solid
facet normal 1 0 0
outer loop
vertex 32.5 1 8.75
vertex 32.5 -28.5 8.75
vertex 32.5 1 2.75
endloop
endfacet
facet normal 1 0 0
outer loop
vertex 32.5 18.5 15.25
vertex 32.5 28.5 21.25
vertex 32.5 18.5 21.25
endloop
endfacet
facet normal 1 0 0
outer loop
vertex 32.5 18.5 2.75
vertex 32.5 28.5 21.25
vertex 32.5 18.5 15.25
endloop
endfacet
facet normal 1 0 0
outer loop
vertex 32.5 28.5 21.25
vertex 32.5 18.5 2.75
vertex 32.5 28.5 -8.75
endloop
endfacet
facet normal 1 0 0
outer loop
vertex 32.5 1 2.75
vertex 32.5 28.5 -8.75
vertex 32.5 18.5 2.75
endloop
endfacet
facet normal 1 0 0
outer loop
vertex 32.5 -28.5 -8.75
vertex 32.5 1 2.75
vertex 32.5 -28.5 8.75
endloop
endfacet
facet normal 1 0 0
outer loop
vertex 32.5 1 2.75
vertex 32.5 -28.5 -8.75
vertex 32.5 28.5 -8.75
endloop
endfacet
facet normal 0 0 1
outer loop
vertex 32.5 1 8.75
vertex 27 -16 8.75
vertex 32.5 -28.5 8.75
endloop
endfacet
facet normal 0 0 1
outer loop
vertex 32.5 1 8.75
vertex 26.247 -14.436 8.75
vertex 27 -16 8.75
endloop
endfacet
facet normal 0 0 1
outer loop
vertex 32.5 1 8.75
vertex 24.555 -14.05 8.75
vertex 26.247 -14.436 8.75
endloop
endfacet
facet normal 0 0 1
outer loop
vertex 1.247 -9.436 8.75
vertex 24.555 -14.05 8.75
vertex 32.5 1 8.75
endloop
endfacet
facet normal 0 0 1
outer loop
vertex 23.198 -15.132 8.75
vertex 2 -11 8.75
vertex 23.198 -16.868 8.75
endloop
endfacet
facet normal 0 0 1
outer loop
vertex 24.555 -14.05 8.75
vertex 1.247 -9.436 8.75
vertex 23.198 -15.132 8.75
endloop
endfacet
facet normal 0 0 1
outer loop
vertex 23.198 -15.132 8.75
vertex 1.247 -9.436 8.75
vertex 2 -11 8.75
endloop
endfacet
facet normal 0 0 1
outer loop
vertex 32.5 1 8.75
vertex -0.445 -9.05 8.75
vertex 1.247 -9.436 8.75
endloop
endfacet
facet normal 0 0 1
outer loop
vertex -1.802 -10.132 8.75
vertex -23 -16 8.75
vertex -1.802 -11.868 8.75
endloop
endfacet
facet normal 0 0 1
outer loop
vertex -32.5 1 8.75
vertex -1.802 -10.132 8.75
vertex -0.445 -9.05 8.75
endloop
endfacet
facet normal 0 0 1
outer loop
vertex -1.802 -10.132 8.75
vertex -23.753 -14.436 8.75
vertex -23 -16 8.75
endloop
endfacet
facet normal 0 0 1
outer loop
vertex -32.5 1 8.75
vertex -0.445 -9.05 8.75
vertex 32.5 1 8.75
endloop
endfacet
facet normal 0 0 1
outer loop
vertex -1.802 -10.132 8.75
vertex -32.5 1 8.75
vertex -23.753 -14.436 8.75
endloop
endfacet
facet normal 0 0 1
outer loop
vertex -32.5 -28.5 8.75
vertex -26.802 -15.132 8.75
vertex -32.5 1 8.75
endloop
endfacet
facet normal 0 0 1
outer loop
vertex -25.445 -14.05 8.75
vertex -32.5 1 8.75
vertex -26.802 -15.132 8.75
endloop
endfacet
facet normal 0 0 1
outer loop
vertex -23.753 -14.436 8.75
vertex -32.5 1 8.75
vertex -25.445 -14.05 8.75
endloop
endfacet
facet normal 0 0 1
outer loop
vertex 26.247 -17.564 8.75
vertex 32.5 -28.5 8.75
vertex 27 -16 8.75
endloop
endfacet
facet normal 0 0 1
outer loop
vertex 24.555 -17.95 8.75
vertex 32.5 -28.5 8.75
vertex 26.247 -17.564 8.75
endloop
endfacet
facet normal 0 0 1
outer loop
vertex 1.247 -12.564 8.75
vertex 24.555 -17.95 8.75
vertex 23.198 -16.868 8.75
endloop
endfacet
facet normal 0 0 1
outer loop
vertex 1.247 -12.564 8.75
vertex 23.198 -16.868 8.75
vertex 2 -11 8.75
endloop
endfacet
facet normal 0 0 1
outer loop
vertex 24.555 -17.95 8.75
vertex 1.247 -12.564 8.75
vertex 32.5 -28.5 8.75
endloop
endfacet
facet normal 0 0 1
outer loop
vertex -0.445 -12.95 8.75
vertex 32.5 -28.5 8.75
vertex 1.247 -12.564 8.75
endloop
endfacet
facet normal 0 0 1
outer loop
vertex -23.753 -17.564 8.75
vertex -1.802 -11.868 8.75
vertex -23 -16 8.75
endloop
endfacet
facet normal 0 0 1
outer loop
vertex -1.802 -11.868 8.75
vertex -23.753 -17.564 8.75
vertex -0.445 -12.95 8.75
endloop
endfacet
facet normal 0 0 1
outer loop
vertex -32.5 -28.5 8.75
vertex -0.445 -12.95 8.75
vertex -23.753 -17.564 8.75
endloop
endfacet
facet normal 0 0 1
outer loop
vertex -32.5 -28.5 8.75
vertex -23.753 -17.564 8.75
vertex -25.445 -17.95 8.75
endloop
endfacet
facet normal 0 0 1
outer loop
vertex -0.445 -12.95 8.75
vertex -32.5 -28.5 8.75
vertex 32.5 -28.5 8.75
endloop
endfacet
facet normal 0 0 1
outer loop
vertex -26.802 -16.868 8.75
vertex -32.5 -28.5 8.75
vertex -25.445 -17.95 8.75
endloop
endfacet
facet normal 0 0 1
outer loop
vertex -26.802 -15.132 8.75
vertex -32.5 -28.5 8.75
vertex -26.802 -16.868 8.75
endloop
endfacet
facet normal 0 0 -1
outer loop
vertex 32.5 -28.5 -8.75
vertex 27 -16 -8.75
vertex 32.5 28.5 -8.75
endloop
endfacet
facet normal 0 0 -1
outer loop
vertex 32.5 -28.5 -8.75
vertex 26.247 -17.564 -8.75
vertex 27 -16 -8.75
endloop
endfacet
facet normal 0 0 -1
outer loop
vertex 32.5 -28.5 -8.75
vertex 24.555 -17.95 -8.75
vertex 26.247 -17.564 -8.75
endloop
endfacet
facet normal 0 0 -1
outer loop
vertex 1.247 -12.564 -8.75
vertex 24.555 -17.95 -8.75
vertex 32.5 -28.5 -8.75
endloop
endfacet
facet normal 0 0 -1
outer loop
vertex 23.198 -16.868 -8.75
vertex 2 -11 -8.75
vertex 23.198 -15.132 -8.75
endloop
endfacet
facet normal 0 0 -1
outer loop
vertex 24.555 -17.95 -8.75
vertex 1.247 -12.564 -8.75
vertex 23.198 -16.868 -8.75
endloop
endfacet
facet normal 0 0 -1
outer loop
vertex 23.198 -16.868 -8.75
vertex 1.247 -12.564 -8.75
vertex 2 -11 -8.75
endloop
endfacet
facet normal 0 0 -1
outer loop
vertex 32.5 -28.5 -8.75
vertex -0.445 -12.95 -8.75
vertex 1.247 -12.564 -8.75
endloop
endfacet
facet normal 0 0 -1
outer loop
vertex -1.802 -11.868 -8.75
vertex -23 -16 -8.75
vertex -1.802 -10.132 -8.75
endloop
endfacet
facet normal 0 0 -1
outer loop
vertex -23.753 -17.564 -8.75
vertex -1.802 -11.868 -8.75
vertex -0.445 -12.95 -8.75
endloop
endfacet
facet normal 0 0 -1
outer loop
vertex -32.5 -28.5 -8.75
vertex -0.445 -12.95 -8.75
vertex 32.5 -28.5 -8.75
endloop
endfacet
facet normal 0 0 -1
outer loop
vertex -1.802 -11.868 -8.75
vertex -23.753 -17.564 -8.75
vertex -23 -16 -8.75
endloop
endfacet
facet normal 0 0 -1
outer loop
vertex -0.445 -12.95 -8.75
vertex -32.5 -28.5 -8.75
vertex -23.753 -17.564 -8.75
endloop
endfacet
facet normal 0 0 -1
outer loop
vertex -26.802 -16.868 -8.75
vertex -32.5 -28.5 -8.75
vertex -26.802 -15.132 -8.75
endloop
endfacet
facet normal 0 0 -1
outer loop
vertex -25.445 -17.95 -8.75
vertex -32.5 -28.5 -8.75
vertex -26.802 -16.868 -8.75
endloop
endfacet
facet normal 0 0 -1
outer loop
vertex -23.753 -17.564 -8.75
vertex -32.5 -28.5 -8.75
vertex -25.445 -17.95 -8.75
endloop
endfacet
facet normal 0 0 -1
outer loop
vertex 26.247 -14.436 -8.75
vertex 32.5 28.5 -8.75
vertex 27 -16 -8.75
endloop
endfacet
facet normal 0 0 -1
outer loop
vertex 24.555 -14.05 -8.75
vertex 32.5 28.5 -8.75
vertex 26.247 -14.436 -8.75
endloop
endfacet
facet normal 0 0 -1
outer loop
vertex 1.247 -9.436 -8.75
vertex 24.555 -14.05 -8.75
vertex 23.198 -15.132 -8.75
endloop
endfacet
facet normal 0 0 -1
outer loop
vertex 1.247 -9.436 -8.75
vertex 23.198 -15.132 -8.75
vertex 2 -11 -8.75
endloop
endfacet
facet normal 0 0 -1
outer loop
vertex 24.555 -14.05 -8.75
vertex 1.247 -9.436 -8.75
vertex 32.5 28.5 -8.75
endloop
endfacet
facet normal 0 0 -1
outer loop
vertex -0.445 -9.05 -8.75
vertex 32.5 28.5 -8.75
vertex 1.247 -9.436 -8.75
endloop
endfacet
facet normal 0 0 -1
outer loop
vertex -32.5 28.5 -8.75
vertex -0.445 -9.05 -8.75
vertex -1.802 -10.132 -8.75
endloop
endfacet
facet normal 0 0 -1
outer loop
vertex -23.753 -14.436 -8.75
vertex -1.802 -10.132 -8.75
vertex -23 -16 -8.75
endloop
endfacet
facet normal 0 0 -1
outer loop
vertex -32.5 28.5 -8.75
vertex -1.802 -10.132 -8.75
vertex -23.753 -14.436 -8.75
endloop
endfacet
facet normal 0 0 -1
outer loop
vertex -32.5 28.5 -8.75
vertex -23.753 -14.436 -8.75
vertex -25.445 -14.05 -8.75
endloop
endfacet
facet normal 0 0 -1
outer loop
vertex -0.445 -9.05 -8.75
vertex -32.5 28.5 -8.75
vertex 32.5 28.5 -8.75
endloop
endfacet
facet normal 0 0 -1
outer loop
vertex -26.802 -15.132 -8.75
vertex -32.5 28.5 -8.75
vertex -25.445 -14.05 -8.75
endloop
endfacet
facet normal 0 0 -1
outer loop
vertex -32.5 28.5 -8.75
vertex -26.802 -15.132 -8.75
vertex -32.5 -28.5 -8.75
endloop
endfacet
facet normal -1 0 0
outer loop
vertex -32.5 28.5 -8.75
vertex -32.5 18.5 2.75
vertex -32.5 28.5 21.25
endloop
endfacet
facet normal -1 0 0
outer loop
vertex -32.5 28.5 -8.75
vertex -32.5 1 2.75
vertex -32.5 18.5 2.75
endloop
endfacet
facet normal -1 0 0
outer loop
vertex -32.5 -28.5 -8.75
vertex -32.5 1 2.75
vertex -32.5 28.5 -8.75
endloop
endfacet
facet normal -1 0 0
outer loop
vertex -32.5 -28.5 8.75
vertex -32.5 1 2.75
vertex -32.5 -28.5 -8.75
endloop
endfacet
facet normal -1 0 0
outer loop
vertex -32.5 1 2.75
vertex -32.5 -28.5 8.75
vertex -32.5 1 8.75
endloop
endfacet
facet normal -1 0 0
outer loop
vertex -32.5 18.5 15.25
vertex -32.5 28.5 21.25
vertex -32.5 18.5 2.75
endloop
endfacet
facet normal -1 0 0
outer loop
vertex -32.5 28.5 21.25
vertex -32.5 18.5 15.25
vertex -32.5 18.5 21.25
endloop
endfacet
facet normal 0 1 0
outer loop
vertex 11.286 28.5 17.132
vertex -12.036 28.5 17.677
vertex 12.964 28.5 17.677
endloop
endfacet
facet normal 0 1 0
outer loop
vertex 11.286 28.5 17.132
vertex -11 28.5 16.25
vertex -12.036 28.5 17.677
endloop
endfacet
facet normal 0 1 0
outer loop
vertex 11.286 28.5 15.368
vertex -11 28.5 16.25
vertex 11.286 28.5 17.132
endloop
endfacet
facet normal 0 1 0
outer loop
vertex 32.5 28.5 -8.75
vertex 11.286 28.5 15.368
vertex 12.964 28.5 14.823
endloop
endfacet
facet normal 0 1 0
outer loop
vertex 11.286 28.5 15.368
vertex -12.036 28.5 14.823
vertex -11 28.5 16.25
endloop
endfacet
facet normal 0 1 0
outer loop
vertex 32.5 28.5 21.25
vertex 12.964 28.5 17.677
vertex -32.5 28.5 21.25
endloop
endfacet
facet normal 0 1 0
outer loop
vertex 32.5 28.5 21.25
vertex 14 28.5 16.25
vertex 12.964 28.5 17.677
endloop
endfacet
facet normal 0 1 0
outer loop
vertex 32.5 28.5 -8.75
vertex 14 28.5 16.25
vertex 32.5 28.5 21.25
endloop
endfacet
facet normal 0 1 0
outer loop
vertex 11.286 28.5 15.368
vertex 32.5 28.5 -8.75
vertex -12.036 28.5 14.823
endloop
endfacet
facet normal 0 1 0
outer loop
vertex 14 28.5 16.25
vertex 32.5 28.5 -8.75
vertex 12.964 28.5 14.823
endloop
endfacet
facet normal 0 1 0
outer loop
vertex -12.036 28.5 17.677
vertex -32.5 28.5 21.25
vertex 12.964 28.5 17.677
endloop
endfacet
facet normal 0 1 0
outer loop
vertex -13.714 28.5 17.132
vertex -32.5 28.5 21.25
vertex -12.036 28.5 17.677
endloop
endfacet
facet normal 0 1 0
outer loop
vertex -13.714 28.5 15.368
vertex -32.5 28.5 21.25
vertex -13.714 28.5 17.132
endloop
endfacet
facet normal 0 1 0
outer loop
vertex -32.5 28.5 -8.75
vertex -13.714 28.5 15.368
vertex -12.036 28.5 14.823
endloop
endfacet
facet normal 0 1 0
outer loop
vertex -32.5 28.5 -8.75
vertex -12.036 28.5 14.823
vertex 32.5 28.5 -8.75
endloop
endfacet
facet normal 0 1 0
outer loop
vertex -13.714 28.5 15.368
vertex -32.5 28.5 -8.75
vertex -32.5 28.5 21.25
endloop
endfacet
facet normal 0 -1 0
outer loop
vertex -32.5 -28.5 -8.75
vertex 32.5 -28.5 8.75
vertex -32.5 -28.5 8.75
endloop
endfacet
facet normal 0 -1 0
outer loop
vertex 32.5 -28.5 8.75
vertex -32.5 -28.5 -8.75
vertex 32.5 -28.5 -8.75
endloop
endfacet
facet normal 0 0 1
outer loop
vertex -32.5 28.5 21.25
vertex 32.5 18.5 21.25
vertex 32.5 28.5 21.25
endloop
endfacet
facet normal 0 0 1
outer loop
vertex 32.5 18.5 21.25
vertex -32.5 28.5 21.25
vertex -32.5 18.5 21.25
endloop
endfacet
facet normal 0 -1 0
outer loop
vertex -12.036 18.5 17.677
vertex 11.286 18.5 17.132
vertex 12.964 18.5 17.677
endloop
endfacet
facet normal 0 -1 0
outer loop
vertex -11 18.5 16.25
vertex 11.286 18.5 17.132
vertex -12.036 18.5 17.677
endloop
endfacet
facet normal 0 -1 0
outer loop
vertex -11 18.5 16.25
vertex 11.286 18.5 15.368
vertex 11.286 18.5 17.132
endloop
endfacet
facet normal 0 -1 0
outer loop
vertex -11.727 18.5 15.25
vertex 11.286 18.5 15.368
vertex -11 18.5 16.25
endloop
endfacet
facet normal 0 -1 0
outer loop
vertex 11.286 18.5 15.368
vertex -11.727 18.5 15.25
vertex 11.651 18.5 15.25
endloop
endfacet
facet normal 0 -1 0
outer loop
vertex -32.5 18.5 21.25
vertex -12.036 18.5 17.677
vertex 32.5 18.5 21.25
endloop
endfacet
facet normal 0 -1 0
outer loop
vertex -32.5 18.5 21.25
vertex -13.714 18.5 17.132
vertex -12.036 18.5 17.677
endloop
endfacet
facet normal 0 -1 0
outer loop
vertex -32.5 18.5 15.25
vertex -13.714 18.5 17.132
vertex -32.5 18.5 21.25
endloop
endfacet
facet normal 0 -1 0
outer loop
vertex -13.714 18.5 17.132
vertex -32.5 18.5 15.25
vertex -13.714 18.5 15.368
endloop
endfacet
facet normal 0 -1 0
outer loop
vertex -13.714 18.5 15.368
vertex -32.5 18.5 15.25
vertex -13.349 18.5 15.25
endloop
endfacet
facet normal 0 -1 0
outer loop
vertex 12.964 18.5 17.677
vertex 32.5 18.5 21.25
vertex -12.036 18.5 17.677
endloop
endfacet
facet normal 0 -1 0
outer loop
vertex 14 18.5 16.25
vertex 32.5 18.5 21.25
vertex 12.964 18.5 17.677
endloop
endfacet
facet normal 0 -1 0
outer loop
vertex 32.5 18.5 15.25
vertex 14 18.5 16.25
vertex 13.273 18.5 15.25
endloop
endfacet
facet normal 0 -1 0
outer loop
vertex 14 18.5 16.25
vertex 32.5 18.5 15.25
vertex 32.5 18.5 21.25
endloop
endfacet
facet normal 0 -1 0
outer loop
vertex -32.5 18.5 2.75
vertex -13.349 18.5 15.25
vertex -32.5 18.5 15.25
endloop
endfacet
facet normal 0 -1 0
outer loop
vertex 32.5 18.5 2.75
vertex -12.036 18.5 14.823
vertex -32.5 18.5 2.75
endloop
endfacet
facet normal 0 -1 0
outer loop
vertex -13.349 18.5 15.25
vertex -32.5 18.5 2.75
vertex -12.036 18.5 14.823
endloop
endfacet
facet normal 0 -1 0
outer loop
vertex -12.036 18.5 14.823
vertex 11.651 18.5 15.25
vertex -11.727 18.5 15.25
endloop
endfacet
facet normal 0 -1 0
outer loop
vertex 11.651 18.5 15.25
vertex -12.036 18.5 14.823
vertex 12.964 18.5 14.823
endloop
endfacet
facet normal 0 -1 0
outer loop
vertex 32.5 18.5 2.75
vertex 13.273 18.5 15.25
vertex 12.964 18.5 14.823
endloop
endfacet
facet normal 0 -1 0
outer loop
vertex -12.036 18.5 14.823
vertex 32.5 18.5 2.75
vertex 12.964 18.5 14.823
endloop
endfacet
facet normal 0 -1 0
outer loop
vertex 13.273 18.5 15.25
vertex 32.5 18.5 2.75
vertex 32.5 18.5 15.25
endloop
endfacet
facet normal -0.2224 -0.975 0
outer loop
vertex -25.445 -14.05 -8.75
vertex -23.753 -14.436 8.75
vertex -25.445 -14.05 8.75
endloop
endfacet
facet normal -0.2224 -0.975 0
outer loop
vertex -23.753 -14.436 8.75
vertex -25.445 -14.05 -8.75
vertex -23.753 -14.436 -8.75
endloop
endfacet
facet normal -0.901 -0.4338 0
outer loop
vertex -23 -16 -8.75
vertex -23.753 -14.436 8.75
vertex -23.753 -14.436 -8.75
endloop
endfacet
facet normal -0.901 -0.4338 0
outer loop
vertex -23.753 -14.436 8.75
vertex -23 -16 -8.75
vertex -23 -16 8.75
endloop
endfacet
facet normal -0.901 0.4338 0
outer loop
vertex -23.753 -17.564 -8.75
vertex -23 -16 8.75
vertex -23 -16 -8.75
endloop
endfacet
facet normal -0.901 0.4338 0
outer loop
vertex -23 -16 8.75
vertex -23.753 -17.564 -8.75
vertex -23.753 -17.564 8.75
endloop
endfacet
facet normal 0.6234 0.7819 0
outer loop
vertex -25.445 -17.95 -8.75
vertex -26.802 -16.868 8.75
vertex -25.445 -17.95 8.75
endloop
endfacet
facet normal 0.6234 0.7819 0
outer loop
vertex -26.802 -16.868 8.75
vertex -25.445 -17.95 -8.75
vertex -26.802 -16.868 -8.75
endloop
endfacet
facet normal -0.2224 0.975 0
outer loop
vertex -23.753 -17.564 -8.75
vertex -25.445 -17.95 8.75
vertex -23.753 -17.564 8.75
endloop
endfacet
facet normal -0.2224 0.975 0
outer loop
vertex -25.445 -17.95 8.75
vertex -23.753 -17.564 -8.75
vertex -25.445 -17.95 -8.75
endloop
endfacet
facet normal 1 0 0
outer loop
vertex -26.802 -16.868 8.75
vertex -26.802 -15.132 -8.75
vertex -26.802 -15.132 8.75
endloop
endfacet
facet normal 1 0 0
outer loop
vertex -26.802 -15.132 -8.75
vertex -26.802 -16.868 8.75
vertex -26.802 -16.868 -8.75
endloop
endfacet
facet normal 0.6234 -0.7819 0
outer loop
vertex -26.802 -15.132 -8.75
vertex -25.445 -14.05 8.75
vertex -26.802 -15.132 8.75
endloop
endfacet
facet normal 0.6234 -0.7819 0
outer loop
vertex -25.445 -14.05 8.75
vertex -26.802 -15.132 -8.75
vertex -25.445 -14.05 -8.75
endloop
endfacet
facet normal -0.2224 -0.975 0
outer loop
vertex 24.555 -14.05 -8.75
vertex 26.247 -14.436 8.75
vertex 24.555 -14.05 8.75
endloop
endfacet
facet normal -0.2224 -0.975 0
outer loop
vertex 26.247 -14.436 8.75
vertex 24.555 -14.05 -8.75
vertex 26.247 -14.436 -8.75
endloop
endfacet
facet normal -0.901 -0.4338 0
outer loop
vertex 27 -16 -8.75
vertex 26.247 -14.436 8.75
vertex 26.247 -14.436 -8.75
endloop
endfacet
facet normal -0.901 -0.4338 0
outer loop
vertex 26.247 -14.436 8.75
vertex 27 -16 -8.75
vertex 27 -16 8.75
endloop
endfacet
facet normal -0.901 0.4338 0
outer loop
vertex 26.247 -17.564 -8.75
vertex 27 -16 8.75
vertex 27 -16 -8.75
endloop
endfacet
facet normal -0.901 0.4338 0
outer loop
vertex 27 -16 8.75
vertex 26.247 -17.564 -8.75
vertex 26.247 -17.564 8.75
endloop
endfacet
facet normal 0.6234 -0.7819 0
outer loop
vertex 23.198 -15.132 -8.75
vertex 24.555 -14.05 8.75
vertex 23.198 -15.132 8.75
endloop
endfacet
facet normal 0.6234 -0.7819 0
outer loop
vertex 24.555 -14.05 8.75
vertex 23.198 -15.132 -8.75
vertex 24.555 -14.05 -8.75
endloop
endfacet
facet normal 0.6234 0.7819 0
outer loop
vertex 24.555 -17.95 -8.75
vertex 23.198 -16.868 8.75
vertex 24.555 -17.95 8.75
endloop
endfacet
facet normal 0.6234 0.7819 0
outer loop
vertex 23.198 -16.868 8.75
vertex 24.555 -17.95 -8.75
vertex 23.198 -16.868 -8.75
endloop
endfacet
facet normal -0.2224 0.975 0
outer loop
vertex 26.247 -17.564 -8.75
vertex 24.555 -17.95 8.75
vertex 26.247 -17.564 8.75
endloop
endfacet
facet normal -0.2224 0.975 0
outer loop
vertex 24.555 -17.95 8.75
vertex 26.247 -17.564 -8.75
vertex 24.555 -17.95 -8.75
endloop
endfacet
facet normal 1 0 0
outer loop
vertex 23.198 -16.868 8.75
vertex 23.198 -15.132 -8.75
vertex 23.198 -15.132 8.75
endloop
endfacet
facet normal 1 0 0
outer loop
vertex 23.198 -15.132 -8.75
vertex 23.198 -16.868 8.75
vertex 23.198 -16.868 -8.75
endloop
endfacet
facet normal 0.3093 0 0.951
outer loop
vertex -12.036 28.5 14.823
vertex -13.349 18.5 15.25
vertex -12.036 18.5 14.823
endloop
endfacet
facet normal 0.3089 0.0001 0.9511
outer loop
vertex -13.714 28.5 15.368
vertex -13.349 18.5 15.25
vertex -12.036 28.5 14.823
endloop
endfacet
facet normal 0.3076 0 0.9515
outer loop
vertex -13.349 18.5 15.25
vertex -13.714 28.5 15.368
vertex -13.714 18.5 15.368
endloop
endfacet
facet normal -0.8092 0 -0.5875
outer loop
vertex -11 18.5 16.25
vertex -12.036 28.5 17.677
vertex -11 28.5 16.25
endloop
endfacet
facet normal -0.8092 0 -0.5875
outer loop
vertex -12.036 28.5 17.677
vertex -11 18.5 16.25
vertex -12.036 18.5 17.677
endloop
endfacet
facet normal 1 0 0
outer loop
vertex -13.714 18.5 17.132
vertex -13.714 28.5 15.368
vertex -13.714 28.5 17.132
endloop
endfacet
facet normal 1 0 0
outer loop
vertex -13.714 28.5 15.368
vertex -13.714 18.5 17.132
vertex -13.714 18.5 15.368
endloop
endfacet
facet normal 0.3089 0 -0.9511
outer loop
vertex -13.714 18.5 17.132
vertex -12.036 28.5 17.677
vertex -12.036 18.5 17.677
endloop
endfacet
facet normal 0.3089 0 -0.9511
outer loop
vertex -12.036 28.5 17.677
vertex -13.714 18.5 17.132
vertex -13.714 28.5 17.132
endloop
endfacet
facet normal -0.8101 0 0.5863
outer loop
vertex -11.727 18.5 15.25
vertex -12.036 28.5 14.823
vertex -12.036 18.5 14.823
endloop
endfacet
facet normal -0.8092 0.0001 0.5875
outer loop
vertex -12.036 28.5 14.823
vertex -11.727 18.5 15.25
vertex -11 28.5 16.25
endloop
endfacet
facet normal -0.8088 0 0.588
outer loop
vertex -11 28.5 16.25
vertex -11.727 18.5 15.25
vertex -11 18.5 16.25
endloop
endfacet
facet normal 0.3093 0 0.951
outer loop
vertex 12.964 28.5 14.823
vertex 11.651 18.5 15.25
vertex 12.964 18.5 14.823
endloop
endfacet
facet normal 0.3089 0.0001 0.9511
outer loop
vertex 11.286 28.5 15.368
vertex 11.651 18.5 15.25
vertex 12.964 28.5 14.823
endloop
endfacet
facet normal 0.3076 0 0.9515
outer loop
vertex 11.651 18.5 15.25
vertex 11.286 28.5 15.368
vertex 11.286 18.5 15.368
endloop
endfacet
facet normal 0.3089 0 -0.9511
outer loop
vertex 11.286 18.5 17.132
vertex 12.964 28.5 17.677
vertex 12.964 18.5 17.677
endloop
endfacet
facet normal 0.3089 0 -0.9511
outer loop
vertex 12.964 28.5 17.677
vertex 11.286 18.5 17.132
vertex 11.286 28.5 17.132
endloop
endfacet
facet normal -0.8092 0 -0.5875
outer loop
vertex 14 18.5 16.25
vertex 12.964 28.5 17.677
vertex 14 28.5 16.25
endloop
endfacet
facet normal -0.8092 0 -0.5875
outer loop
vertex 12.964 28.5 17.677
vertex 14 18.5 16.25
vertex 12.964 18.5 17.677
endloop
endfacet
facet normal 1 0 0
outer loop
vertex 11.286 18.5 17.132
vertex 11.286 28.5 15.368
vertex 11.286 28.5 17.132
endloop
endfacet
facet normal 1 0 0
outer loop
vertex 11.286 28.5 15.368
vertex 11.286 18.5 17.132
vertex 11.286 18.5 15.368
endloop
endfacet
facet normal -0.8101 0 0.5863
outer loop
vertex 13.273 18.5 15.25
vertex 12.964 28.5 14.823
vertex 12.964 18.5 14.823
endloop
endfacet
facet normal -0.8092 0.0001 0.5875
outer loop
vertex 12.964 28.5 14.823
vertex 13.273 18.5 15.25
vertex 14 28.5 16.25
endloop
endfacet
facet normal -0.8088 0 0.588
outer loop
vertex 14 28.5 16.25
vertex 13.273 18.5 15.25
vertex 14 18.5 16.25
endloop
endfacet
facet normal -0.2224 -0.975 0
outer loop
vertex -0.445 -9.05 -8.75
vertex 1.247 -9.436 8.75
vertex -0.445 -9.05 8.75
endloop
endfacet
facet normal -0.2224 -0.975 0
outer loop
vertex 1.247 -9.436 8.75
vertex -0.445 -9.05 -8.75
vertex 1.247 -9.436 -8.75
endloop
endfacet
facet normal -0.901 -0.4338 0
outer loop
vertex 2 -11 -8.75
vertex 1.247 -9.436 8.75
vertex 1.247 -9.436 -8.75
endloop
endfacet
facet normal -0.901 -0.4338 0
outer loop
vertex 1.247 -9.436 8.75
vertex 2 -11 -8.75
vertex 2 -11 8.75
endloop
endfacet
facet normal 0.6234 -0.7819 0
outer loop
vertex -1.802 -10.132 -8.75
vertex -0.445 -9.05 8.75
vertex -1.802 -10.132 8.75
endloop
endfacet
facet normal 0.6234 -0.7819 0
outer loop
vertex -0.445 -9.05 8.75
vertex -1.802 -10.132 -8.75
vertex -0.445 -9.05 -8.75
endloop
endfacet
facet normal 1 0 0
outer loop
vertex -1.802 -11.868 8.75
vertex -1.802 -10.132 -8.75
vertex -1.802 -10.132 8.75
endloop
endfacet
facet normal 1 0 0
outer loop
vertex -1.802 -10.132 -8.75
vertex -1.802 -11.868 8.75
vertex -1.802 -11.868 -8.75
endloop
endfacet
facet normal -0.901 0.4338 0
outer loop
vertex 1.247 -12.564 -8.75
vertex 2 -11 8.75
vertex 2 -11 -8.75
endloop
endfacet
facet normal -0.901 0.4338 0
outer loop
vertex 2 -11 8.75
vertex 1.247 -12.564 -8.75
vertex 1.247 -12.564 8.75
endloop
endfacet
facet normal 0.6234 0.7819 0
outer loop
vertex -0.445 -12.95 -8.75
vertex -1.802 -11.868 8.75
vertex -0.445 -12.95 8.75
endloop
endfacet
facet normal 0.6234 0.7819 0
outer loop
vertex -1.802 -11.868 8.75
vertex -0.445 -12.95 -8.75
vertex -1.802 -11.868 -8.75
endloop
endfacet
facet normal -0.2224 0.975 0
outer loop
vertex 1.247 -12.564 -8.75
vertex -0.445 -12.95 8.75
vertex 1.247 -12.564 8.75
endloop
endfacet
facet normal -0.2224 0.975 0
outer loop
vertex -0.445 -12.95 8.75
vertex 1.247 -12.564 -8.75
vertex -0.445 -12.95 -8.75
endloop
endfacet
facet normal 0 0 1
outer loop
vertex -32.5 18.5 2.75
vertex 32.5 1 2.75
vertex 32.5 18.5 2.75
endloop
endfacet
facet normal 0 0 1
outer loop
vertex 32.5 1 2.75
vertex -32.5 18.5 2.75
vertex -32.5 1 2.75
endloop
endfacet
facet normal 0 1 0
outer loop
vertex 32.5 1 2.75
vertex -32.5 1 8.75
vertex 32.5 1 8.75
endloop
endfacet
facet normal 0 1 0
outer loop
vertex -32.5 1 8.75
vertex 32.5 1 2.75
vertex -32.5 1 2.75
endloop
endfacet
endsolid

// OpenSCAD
difference() {
	union() {
		cube([65, 57, 17.5], center = true);
		hull() {
			translate([0, 57/2 - 10/2, 12.5/2])
				cube([65, 10, 17.5 + 12.5], center = true);
			//translate([0, 57/2 - 5/2 - 15, 0])
			//	cube([65, 5, 5], center = true);
		}
	}

	for(x = [-25, 25])
		translate([x, 12.5 - 57/2, 0])
			cylinder(d = 4, h = 17.5, center = true);
	translate([0, 12.5 - 57/2 + 5, 0])
		cylinder(d = 4, h = 17.5, center = true);

	for(x = [-12.5, 12.5])
		translate([x, 0, 17.5/2 + 12.5 - 5])
			rotate([90, 0, 0])
				cylinder(d = 3, h = 100, center = true);

	translate([0, 10-0.25, 17.5/2 + 12.5/2 - 5 - 1])
		cube([65, 17.5, 12.5], center = true);
}
